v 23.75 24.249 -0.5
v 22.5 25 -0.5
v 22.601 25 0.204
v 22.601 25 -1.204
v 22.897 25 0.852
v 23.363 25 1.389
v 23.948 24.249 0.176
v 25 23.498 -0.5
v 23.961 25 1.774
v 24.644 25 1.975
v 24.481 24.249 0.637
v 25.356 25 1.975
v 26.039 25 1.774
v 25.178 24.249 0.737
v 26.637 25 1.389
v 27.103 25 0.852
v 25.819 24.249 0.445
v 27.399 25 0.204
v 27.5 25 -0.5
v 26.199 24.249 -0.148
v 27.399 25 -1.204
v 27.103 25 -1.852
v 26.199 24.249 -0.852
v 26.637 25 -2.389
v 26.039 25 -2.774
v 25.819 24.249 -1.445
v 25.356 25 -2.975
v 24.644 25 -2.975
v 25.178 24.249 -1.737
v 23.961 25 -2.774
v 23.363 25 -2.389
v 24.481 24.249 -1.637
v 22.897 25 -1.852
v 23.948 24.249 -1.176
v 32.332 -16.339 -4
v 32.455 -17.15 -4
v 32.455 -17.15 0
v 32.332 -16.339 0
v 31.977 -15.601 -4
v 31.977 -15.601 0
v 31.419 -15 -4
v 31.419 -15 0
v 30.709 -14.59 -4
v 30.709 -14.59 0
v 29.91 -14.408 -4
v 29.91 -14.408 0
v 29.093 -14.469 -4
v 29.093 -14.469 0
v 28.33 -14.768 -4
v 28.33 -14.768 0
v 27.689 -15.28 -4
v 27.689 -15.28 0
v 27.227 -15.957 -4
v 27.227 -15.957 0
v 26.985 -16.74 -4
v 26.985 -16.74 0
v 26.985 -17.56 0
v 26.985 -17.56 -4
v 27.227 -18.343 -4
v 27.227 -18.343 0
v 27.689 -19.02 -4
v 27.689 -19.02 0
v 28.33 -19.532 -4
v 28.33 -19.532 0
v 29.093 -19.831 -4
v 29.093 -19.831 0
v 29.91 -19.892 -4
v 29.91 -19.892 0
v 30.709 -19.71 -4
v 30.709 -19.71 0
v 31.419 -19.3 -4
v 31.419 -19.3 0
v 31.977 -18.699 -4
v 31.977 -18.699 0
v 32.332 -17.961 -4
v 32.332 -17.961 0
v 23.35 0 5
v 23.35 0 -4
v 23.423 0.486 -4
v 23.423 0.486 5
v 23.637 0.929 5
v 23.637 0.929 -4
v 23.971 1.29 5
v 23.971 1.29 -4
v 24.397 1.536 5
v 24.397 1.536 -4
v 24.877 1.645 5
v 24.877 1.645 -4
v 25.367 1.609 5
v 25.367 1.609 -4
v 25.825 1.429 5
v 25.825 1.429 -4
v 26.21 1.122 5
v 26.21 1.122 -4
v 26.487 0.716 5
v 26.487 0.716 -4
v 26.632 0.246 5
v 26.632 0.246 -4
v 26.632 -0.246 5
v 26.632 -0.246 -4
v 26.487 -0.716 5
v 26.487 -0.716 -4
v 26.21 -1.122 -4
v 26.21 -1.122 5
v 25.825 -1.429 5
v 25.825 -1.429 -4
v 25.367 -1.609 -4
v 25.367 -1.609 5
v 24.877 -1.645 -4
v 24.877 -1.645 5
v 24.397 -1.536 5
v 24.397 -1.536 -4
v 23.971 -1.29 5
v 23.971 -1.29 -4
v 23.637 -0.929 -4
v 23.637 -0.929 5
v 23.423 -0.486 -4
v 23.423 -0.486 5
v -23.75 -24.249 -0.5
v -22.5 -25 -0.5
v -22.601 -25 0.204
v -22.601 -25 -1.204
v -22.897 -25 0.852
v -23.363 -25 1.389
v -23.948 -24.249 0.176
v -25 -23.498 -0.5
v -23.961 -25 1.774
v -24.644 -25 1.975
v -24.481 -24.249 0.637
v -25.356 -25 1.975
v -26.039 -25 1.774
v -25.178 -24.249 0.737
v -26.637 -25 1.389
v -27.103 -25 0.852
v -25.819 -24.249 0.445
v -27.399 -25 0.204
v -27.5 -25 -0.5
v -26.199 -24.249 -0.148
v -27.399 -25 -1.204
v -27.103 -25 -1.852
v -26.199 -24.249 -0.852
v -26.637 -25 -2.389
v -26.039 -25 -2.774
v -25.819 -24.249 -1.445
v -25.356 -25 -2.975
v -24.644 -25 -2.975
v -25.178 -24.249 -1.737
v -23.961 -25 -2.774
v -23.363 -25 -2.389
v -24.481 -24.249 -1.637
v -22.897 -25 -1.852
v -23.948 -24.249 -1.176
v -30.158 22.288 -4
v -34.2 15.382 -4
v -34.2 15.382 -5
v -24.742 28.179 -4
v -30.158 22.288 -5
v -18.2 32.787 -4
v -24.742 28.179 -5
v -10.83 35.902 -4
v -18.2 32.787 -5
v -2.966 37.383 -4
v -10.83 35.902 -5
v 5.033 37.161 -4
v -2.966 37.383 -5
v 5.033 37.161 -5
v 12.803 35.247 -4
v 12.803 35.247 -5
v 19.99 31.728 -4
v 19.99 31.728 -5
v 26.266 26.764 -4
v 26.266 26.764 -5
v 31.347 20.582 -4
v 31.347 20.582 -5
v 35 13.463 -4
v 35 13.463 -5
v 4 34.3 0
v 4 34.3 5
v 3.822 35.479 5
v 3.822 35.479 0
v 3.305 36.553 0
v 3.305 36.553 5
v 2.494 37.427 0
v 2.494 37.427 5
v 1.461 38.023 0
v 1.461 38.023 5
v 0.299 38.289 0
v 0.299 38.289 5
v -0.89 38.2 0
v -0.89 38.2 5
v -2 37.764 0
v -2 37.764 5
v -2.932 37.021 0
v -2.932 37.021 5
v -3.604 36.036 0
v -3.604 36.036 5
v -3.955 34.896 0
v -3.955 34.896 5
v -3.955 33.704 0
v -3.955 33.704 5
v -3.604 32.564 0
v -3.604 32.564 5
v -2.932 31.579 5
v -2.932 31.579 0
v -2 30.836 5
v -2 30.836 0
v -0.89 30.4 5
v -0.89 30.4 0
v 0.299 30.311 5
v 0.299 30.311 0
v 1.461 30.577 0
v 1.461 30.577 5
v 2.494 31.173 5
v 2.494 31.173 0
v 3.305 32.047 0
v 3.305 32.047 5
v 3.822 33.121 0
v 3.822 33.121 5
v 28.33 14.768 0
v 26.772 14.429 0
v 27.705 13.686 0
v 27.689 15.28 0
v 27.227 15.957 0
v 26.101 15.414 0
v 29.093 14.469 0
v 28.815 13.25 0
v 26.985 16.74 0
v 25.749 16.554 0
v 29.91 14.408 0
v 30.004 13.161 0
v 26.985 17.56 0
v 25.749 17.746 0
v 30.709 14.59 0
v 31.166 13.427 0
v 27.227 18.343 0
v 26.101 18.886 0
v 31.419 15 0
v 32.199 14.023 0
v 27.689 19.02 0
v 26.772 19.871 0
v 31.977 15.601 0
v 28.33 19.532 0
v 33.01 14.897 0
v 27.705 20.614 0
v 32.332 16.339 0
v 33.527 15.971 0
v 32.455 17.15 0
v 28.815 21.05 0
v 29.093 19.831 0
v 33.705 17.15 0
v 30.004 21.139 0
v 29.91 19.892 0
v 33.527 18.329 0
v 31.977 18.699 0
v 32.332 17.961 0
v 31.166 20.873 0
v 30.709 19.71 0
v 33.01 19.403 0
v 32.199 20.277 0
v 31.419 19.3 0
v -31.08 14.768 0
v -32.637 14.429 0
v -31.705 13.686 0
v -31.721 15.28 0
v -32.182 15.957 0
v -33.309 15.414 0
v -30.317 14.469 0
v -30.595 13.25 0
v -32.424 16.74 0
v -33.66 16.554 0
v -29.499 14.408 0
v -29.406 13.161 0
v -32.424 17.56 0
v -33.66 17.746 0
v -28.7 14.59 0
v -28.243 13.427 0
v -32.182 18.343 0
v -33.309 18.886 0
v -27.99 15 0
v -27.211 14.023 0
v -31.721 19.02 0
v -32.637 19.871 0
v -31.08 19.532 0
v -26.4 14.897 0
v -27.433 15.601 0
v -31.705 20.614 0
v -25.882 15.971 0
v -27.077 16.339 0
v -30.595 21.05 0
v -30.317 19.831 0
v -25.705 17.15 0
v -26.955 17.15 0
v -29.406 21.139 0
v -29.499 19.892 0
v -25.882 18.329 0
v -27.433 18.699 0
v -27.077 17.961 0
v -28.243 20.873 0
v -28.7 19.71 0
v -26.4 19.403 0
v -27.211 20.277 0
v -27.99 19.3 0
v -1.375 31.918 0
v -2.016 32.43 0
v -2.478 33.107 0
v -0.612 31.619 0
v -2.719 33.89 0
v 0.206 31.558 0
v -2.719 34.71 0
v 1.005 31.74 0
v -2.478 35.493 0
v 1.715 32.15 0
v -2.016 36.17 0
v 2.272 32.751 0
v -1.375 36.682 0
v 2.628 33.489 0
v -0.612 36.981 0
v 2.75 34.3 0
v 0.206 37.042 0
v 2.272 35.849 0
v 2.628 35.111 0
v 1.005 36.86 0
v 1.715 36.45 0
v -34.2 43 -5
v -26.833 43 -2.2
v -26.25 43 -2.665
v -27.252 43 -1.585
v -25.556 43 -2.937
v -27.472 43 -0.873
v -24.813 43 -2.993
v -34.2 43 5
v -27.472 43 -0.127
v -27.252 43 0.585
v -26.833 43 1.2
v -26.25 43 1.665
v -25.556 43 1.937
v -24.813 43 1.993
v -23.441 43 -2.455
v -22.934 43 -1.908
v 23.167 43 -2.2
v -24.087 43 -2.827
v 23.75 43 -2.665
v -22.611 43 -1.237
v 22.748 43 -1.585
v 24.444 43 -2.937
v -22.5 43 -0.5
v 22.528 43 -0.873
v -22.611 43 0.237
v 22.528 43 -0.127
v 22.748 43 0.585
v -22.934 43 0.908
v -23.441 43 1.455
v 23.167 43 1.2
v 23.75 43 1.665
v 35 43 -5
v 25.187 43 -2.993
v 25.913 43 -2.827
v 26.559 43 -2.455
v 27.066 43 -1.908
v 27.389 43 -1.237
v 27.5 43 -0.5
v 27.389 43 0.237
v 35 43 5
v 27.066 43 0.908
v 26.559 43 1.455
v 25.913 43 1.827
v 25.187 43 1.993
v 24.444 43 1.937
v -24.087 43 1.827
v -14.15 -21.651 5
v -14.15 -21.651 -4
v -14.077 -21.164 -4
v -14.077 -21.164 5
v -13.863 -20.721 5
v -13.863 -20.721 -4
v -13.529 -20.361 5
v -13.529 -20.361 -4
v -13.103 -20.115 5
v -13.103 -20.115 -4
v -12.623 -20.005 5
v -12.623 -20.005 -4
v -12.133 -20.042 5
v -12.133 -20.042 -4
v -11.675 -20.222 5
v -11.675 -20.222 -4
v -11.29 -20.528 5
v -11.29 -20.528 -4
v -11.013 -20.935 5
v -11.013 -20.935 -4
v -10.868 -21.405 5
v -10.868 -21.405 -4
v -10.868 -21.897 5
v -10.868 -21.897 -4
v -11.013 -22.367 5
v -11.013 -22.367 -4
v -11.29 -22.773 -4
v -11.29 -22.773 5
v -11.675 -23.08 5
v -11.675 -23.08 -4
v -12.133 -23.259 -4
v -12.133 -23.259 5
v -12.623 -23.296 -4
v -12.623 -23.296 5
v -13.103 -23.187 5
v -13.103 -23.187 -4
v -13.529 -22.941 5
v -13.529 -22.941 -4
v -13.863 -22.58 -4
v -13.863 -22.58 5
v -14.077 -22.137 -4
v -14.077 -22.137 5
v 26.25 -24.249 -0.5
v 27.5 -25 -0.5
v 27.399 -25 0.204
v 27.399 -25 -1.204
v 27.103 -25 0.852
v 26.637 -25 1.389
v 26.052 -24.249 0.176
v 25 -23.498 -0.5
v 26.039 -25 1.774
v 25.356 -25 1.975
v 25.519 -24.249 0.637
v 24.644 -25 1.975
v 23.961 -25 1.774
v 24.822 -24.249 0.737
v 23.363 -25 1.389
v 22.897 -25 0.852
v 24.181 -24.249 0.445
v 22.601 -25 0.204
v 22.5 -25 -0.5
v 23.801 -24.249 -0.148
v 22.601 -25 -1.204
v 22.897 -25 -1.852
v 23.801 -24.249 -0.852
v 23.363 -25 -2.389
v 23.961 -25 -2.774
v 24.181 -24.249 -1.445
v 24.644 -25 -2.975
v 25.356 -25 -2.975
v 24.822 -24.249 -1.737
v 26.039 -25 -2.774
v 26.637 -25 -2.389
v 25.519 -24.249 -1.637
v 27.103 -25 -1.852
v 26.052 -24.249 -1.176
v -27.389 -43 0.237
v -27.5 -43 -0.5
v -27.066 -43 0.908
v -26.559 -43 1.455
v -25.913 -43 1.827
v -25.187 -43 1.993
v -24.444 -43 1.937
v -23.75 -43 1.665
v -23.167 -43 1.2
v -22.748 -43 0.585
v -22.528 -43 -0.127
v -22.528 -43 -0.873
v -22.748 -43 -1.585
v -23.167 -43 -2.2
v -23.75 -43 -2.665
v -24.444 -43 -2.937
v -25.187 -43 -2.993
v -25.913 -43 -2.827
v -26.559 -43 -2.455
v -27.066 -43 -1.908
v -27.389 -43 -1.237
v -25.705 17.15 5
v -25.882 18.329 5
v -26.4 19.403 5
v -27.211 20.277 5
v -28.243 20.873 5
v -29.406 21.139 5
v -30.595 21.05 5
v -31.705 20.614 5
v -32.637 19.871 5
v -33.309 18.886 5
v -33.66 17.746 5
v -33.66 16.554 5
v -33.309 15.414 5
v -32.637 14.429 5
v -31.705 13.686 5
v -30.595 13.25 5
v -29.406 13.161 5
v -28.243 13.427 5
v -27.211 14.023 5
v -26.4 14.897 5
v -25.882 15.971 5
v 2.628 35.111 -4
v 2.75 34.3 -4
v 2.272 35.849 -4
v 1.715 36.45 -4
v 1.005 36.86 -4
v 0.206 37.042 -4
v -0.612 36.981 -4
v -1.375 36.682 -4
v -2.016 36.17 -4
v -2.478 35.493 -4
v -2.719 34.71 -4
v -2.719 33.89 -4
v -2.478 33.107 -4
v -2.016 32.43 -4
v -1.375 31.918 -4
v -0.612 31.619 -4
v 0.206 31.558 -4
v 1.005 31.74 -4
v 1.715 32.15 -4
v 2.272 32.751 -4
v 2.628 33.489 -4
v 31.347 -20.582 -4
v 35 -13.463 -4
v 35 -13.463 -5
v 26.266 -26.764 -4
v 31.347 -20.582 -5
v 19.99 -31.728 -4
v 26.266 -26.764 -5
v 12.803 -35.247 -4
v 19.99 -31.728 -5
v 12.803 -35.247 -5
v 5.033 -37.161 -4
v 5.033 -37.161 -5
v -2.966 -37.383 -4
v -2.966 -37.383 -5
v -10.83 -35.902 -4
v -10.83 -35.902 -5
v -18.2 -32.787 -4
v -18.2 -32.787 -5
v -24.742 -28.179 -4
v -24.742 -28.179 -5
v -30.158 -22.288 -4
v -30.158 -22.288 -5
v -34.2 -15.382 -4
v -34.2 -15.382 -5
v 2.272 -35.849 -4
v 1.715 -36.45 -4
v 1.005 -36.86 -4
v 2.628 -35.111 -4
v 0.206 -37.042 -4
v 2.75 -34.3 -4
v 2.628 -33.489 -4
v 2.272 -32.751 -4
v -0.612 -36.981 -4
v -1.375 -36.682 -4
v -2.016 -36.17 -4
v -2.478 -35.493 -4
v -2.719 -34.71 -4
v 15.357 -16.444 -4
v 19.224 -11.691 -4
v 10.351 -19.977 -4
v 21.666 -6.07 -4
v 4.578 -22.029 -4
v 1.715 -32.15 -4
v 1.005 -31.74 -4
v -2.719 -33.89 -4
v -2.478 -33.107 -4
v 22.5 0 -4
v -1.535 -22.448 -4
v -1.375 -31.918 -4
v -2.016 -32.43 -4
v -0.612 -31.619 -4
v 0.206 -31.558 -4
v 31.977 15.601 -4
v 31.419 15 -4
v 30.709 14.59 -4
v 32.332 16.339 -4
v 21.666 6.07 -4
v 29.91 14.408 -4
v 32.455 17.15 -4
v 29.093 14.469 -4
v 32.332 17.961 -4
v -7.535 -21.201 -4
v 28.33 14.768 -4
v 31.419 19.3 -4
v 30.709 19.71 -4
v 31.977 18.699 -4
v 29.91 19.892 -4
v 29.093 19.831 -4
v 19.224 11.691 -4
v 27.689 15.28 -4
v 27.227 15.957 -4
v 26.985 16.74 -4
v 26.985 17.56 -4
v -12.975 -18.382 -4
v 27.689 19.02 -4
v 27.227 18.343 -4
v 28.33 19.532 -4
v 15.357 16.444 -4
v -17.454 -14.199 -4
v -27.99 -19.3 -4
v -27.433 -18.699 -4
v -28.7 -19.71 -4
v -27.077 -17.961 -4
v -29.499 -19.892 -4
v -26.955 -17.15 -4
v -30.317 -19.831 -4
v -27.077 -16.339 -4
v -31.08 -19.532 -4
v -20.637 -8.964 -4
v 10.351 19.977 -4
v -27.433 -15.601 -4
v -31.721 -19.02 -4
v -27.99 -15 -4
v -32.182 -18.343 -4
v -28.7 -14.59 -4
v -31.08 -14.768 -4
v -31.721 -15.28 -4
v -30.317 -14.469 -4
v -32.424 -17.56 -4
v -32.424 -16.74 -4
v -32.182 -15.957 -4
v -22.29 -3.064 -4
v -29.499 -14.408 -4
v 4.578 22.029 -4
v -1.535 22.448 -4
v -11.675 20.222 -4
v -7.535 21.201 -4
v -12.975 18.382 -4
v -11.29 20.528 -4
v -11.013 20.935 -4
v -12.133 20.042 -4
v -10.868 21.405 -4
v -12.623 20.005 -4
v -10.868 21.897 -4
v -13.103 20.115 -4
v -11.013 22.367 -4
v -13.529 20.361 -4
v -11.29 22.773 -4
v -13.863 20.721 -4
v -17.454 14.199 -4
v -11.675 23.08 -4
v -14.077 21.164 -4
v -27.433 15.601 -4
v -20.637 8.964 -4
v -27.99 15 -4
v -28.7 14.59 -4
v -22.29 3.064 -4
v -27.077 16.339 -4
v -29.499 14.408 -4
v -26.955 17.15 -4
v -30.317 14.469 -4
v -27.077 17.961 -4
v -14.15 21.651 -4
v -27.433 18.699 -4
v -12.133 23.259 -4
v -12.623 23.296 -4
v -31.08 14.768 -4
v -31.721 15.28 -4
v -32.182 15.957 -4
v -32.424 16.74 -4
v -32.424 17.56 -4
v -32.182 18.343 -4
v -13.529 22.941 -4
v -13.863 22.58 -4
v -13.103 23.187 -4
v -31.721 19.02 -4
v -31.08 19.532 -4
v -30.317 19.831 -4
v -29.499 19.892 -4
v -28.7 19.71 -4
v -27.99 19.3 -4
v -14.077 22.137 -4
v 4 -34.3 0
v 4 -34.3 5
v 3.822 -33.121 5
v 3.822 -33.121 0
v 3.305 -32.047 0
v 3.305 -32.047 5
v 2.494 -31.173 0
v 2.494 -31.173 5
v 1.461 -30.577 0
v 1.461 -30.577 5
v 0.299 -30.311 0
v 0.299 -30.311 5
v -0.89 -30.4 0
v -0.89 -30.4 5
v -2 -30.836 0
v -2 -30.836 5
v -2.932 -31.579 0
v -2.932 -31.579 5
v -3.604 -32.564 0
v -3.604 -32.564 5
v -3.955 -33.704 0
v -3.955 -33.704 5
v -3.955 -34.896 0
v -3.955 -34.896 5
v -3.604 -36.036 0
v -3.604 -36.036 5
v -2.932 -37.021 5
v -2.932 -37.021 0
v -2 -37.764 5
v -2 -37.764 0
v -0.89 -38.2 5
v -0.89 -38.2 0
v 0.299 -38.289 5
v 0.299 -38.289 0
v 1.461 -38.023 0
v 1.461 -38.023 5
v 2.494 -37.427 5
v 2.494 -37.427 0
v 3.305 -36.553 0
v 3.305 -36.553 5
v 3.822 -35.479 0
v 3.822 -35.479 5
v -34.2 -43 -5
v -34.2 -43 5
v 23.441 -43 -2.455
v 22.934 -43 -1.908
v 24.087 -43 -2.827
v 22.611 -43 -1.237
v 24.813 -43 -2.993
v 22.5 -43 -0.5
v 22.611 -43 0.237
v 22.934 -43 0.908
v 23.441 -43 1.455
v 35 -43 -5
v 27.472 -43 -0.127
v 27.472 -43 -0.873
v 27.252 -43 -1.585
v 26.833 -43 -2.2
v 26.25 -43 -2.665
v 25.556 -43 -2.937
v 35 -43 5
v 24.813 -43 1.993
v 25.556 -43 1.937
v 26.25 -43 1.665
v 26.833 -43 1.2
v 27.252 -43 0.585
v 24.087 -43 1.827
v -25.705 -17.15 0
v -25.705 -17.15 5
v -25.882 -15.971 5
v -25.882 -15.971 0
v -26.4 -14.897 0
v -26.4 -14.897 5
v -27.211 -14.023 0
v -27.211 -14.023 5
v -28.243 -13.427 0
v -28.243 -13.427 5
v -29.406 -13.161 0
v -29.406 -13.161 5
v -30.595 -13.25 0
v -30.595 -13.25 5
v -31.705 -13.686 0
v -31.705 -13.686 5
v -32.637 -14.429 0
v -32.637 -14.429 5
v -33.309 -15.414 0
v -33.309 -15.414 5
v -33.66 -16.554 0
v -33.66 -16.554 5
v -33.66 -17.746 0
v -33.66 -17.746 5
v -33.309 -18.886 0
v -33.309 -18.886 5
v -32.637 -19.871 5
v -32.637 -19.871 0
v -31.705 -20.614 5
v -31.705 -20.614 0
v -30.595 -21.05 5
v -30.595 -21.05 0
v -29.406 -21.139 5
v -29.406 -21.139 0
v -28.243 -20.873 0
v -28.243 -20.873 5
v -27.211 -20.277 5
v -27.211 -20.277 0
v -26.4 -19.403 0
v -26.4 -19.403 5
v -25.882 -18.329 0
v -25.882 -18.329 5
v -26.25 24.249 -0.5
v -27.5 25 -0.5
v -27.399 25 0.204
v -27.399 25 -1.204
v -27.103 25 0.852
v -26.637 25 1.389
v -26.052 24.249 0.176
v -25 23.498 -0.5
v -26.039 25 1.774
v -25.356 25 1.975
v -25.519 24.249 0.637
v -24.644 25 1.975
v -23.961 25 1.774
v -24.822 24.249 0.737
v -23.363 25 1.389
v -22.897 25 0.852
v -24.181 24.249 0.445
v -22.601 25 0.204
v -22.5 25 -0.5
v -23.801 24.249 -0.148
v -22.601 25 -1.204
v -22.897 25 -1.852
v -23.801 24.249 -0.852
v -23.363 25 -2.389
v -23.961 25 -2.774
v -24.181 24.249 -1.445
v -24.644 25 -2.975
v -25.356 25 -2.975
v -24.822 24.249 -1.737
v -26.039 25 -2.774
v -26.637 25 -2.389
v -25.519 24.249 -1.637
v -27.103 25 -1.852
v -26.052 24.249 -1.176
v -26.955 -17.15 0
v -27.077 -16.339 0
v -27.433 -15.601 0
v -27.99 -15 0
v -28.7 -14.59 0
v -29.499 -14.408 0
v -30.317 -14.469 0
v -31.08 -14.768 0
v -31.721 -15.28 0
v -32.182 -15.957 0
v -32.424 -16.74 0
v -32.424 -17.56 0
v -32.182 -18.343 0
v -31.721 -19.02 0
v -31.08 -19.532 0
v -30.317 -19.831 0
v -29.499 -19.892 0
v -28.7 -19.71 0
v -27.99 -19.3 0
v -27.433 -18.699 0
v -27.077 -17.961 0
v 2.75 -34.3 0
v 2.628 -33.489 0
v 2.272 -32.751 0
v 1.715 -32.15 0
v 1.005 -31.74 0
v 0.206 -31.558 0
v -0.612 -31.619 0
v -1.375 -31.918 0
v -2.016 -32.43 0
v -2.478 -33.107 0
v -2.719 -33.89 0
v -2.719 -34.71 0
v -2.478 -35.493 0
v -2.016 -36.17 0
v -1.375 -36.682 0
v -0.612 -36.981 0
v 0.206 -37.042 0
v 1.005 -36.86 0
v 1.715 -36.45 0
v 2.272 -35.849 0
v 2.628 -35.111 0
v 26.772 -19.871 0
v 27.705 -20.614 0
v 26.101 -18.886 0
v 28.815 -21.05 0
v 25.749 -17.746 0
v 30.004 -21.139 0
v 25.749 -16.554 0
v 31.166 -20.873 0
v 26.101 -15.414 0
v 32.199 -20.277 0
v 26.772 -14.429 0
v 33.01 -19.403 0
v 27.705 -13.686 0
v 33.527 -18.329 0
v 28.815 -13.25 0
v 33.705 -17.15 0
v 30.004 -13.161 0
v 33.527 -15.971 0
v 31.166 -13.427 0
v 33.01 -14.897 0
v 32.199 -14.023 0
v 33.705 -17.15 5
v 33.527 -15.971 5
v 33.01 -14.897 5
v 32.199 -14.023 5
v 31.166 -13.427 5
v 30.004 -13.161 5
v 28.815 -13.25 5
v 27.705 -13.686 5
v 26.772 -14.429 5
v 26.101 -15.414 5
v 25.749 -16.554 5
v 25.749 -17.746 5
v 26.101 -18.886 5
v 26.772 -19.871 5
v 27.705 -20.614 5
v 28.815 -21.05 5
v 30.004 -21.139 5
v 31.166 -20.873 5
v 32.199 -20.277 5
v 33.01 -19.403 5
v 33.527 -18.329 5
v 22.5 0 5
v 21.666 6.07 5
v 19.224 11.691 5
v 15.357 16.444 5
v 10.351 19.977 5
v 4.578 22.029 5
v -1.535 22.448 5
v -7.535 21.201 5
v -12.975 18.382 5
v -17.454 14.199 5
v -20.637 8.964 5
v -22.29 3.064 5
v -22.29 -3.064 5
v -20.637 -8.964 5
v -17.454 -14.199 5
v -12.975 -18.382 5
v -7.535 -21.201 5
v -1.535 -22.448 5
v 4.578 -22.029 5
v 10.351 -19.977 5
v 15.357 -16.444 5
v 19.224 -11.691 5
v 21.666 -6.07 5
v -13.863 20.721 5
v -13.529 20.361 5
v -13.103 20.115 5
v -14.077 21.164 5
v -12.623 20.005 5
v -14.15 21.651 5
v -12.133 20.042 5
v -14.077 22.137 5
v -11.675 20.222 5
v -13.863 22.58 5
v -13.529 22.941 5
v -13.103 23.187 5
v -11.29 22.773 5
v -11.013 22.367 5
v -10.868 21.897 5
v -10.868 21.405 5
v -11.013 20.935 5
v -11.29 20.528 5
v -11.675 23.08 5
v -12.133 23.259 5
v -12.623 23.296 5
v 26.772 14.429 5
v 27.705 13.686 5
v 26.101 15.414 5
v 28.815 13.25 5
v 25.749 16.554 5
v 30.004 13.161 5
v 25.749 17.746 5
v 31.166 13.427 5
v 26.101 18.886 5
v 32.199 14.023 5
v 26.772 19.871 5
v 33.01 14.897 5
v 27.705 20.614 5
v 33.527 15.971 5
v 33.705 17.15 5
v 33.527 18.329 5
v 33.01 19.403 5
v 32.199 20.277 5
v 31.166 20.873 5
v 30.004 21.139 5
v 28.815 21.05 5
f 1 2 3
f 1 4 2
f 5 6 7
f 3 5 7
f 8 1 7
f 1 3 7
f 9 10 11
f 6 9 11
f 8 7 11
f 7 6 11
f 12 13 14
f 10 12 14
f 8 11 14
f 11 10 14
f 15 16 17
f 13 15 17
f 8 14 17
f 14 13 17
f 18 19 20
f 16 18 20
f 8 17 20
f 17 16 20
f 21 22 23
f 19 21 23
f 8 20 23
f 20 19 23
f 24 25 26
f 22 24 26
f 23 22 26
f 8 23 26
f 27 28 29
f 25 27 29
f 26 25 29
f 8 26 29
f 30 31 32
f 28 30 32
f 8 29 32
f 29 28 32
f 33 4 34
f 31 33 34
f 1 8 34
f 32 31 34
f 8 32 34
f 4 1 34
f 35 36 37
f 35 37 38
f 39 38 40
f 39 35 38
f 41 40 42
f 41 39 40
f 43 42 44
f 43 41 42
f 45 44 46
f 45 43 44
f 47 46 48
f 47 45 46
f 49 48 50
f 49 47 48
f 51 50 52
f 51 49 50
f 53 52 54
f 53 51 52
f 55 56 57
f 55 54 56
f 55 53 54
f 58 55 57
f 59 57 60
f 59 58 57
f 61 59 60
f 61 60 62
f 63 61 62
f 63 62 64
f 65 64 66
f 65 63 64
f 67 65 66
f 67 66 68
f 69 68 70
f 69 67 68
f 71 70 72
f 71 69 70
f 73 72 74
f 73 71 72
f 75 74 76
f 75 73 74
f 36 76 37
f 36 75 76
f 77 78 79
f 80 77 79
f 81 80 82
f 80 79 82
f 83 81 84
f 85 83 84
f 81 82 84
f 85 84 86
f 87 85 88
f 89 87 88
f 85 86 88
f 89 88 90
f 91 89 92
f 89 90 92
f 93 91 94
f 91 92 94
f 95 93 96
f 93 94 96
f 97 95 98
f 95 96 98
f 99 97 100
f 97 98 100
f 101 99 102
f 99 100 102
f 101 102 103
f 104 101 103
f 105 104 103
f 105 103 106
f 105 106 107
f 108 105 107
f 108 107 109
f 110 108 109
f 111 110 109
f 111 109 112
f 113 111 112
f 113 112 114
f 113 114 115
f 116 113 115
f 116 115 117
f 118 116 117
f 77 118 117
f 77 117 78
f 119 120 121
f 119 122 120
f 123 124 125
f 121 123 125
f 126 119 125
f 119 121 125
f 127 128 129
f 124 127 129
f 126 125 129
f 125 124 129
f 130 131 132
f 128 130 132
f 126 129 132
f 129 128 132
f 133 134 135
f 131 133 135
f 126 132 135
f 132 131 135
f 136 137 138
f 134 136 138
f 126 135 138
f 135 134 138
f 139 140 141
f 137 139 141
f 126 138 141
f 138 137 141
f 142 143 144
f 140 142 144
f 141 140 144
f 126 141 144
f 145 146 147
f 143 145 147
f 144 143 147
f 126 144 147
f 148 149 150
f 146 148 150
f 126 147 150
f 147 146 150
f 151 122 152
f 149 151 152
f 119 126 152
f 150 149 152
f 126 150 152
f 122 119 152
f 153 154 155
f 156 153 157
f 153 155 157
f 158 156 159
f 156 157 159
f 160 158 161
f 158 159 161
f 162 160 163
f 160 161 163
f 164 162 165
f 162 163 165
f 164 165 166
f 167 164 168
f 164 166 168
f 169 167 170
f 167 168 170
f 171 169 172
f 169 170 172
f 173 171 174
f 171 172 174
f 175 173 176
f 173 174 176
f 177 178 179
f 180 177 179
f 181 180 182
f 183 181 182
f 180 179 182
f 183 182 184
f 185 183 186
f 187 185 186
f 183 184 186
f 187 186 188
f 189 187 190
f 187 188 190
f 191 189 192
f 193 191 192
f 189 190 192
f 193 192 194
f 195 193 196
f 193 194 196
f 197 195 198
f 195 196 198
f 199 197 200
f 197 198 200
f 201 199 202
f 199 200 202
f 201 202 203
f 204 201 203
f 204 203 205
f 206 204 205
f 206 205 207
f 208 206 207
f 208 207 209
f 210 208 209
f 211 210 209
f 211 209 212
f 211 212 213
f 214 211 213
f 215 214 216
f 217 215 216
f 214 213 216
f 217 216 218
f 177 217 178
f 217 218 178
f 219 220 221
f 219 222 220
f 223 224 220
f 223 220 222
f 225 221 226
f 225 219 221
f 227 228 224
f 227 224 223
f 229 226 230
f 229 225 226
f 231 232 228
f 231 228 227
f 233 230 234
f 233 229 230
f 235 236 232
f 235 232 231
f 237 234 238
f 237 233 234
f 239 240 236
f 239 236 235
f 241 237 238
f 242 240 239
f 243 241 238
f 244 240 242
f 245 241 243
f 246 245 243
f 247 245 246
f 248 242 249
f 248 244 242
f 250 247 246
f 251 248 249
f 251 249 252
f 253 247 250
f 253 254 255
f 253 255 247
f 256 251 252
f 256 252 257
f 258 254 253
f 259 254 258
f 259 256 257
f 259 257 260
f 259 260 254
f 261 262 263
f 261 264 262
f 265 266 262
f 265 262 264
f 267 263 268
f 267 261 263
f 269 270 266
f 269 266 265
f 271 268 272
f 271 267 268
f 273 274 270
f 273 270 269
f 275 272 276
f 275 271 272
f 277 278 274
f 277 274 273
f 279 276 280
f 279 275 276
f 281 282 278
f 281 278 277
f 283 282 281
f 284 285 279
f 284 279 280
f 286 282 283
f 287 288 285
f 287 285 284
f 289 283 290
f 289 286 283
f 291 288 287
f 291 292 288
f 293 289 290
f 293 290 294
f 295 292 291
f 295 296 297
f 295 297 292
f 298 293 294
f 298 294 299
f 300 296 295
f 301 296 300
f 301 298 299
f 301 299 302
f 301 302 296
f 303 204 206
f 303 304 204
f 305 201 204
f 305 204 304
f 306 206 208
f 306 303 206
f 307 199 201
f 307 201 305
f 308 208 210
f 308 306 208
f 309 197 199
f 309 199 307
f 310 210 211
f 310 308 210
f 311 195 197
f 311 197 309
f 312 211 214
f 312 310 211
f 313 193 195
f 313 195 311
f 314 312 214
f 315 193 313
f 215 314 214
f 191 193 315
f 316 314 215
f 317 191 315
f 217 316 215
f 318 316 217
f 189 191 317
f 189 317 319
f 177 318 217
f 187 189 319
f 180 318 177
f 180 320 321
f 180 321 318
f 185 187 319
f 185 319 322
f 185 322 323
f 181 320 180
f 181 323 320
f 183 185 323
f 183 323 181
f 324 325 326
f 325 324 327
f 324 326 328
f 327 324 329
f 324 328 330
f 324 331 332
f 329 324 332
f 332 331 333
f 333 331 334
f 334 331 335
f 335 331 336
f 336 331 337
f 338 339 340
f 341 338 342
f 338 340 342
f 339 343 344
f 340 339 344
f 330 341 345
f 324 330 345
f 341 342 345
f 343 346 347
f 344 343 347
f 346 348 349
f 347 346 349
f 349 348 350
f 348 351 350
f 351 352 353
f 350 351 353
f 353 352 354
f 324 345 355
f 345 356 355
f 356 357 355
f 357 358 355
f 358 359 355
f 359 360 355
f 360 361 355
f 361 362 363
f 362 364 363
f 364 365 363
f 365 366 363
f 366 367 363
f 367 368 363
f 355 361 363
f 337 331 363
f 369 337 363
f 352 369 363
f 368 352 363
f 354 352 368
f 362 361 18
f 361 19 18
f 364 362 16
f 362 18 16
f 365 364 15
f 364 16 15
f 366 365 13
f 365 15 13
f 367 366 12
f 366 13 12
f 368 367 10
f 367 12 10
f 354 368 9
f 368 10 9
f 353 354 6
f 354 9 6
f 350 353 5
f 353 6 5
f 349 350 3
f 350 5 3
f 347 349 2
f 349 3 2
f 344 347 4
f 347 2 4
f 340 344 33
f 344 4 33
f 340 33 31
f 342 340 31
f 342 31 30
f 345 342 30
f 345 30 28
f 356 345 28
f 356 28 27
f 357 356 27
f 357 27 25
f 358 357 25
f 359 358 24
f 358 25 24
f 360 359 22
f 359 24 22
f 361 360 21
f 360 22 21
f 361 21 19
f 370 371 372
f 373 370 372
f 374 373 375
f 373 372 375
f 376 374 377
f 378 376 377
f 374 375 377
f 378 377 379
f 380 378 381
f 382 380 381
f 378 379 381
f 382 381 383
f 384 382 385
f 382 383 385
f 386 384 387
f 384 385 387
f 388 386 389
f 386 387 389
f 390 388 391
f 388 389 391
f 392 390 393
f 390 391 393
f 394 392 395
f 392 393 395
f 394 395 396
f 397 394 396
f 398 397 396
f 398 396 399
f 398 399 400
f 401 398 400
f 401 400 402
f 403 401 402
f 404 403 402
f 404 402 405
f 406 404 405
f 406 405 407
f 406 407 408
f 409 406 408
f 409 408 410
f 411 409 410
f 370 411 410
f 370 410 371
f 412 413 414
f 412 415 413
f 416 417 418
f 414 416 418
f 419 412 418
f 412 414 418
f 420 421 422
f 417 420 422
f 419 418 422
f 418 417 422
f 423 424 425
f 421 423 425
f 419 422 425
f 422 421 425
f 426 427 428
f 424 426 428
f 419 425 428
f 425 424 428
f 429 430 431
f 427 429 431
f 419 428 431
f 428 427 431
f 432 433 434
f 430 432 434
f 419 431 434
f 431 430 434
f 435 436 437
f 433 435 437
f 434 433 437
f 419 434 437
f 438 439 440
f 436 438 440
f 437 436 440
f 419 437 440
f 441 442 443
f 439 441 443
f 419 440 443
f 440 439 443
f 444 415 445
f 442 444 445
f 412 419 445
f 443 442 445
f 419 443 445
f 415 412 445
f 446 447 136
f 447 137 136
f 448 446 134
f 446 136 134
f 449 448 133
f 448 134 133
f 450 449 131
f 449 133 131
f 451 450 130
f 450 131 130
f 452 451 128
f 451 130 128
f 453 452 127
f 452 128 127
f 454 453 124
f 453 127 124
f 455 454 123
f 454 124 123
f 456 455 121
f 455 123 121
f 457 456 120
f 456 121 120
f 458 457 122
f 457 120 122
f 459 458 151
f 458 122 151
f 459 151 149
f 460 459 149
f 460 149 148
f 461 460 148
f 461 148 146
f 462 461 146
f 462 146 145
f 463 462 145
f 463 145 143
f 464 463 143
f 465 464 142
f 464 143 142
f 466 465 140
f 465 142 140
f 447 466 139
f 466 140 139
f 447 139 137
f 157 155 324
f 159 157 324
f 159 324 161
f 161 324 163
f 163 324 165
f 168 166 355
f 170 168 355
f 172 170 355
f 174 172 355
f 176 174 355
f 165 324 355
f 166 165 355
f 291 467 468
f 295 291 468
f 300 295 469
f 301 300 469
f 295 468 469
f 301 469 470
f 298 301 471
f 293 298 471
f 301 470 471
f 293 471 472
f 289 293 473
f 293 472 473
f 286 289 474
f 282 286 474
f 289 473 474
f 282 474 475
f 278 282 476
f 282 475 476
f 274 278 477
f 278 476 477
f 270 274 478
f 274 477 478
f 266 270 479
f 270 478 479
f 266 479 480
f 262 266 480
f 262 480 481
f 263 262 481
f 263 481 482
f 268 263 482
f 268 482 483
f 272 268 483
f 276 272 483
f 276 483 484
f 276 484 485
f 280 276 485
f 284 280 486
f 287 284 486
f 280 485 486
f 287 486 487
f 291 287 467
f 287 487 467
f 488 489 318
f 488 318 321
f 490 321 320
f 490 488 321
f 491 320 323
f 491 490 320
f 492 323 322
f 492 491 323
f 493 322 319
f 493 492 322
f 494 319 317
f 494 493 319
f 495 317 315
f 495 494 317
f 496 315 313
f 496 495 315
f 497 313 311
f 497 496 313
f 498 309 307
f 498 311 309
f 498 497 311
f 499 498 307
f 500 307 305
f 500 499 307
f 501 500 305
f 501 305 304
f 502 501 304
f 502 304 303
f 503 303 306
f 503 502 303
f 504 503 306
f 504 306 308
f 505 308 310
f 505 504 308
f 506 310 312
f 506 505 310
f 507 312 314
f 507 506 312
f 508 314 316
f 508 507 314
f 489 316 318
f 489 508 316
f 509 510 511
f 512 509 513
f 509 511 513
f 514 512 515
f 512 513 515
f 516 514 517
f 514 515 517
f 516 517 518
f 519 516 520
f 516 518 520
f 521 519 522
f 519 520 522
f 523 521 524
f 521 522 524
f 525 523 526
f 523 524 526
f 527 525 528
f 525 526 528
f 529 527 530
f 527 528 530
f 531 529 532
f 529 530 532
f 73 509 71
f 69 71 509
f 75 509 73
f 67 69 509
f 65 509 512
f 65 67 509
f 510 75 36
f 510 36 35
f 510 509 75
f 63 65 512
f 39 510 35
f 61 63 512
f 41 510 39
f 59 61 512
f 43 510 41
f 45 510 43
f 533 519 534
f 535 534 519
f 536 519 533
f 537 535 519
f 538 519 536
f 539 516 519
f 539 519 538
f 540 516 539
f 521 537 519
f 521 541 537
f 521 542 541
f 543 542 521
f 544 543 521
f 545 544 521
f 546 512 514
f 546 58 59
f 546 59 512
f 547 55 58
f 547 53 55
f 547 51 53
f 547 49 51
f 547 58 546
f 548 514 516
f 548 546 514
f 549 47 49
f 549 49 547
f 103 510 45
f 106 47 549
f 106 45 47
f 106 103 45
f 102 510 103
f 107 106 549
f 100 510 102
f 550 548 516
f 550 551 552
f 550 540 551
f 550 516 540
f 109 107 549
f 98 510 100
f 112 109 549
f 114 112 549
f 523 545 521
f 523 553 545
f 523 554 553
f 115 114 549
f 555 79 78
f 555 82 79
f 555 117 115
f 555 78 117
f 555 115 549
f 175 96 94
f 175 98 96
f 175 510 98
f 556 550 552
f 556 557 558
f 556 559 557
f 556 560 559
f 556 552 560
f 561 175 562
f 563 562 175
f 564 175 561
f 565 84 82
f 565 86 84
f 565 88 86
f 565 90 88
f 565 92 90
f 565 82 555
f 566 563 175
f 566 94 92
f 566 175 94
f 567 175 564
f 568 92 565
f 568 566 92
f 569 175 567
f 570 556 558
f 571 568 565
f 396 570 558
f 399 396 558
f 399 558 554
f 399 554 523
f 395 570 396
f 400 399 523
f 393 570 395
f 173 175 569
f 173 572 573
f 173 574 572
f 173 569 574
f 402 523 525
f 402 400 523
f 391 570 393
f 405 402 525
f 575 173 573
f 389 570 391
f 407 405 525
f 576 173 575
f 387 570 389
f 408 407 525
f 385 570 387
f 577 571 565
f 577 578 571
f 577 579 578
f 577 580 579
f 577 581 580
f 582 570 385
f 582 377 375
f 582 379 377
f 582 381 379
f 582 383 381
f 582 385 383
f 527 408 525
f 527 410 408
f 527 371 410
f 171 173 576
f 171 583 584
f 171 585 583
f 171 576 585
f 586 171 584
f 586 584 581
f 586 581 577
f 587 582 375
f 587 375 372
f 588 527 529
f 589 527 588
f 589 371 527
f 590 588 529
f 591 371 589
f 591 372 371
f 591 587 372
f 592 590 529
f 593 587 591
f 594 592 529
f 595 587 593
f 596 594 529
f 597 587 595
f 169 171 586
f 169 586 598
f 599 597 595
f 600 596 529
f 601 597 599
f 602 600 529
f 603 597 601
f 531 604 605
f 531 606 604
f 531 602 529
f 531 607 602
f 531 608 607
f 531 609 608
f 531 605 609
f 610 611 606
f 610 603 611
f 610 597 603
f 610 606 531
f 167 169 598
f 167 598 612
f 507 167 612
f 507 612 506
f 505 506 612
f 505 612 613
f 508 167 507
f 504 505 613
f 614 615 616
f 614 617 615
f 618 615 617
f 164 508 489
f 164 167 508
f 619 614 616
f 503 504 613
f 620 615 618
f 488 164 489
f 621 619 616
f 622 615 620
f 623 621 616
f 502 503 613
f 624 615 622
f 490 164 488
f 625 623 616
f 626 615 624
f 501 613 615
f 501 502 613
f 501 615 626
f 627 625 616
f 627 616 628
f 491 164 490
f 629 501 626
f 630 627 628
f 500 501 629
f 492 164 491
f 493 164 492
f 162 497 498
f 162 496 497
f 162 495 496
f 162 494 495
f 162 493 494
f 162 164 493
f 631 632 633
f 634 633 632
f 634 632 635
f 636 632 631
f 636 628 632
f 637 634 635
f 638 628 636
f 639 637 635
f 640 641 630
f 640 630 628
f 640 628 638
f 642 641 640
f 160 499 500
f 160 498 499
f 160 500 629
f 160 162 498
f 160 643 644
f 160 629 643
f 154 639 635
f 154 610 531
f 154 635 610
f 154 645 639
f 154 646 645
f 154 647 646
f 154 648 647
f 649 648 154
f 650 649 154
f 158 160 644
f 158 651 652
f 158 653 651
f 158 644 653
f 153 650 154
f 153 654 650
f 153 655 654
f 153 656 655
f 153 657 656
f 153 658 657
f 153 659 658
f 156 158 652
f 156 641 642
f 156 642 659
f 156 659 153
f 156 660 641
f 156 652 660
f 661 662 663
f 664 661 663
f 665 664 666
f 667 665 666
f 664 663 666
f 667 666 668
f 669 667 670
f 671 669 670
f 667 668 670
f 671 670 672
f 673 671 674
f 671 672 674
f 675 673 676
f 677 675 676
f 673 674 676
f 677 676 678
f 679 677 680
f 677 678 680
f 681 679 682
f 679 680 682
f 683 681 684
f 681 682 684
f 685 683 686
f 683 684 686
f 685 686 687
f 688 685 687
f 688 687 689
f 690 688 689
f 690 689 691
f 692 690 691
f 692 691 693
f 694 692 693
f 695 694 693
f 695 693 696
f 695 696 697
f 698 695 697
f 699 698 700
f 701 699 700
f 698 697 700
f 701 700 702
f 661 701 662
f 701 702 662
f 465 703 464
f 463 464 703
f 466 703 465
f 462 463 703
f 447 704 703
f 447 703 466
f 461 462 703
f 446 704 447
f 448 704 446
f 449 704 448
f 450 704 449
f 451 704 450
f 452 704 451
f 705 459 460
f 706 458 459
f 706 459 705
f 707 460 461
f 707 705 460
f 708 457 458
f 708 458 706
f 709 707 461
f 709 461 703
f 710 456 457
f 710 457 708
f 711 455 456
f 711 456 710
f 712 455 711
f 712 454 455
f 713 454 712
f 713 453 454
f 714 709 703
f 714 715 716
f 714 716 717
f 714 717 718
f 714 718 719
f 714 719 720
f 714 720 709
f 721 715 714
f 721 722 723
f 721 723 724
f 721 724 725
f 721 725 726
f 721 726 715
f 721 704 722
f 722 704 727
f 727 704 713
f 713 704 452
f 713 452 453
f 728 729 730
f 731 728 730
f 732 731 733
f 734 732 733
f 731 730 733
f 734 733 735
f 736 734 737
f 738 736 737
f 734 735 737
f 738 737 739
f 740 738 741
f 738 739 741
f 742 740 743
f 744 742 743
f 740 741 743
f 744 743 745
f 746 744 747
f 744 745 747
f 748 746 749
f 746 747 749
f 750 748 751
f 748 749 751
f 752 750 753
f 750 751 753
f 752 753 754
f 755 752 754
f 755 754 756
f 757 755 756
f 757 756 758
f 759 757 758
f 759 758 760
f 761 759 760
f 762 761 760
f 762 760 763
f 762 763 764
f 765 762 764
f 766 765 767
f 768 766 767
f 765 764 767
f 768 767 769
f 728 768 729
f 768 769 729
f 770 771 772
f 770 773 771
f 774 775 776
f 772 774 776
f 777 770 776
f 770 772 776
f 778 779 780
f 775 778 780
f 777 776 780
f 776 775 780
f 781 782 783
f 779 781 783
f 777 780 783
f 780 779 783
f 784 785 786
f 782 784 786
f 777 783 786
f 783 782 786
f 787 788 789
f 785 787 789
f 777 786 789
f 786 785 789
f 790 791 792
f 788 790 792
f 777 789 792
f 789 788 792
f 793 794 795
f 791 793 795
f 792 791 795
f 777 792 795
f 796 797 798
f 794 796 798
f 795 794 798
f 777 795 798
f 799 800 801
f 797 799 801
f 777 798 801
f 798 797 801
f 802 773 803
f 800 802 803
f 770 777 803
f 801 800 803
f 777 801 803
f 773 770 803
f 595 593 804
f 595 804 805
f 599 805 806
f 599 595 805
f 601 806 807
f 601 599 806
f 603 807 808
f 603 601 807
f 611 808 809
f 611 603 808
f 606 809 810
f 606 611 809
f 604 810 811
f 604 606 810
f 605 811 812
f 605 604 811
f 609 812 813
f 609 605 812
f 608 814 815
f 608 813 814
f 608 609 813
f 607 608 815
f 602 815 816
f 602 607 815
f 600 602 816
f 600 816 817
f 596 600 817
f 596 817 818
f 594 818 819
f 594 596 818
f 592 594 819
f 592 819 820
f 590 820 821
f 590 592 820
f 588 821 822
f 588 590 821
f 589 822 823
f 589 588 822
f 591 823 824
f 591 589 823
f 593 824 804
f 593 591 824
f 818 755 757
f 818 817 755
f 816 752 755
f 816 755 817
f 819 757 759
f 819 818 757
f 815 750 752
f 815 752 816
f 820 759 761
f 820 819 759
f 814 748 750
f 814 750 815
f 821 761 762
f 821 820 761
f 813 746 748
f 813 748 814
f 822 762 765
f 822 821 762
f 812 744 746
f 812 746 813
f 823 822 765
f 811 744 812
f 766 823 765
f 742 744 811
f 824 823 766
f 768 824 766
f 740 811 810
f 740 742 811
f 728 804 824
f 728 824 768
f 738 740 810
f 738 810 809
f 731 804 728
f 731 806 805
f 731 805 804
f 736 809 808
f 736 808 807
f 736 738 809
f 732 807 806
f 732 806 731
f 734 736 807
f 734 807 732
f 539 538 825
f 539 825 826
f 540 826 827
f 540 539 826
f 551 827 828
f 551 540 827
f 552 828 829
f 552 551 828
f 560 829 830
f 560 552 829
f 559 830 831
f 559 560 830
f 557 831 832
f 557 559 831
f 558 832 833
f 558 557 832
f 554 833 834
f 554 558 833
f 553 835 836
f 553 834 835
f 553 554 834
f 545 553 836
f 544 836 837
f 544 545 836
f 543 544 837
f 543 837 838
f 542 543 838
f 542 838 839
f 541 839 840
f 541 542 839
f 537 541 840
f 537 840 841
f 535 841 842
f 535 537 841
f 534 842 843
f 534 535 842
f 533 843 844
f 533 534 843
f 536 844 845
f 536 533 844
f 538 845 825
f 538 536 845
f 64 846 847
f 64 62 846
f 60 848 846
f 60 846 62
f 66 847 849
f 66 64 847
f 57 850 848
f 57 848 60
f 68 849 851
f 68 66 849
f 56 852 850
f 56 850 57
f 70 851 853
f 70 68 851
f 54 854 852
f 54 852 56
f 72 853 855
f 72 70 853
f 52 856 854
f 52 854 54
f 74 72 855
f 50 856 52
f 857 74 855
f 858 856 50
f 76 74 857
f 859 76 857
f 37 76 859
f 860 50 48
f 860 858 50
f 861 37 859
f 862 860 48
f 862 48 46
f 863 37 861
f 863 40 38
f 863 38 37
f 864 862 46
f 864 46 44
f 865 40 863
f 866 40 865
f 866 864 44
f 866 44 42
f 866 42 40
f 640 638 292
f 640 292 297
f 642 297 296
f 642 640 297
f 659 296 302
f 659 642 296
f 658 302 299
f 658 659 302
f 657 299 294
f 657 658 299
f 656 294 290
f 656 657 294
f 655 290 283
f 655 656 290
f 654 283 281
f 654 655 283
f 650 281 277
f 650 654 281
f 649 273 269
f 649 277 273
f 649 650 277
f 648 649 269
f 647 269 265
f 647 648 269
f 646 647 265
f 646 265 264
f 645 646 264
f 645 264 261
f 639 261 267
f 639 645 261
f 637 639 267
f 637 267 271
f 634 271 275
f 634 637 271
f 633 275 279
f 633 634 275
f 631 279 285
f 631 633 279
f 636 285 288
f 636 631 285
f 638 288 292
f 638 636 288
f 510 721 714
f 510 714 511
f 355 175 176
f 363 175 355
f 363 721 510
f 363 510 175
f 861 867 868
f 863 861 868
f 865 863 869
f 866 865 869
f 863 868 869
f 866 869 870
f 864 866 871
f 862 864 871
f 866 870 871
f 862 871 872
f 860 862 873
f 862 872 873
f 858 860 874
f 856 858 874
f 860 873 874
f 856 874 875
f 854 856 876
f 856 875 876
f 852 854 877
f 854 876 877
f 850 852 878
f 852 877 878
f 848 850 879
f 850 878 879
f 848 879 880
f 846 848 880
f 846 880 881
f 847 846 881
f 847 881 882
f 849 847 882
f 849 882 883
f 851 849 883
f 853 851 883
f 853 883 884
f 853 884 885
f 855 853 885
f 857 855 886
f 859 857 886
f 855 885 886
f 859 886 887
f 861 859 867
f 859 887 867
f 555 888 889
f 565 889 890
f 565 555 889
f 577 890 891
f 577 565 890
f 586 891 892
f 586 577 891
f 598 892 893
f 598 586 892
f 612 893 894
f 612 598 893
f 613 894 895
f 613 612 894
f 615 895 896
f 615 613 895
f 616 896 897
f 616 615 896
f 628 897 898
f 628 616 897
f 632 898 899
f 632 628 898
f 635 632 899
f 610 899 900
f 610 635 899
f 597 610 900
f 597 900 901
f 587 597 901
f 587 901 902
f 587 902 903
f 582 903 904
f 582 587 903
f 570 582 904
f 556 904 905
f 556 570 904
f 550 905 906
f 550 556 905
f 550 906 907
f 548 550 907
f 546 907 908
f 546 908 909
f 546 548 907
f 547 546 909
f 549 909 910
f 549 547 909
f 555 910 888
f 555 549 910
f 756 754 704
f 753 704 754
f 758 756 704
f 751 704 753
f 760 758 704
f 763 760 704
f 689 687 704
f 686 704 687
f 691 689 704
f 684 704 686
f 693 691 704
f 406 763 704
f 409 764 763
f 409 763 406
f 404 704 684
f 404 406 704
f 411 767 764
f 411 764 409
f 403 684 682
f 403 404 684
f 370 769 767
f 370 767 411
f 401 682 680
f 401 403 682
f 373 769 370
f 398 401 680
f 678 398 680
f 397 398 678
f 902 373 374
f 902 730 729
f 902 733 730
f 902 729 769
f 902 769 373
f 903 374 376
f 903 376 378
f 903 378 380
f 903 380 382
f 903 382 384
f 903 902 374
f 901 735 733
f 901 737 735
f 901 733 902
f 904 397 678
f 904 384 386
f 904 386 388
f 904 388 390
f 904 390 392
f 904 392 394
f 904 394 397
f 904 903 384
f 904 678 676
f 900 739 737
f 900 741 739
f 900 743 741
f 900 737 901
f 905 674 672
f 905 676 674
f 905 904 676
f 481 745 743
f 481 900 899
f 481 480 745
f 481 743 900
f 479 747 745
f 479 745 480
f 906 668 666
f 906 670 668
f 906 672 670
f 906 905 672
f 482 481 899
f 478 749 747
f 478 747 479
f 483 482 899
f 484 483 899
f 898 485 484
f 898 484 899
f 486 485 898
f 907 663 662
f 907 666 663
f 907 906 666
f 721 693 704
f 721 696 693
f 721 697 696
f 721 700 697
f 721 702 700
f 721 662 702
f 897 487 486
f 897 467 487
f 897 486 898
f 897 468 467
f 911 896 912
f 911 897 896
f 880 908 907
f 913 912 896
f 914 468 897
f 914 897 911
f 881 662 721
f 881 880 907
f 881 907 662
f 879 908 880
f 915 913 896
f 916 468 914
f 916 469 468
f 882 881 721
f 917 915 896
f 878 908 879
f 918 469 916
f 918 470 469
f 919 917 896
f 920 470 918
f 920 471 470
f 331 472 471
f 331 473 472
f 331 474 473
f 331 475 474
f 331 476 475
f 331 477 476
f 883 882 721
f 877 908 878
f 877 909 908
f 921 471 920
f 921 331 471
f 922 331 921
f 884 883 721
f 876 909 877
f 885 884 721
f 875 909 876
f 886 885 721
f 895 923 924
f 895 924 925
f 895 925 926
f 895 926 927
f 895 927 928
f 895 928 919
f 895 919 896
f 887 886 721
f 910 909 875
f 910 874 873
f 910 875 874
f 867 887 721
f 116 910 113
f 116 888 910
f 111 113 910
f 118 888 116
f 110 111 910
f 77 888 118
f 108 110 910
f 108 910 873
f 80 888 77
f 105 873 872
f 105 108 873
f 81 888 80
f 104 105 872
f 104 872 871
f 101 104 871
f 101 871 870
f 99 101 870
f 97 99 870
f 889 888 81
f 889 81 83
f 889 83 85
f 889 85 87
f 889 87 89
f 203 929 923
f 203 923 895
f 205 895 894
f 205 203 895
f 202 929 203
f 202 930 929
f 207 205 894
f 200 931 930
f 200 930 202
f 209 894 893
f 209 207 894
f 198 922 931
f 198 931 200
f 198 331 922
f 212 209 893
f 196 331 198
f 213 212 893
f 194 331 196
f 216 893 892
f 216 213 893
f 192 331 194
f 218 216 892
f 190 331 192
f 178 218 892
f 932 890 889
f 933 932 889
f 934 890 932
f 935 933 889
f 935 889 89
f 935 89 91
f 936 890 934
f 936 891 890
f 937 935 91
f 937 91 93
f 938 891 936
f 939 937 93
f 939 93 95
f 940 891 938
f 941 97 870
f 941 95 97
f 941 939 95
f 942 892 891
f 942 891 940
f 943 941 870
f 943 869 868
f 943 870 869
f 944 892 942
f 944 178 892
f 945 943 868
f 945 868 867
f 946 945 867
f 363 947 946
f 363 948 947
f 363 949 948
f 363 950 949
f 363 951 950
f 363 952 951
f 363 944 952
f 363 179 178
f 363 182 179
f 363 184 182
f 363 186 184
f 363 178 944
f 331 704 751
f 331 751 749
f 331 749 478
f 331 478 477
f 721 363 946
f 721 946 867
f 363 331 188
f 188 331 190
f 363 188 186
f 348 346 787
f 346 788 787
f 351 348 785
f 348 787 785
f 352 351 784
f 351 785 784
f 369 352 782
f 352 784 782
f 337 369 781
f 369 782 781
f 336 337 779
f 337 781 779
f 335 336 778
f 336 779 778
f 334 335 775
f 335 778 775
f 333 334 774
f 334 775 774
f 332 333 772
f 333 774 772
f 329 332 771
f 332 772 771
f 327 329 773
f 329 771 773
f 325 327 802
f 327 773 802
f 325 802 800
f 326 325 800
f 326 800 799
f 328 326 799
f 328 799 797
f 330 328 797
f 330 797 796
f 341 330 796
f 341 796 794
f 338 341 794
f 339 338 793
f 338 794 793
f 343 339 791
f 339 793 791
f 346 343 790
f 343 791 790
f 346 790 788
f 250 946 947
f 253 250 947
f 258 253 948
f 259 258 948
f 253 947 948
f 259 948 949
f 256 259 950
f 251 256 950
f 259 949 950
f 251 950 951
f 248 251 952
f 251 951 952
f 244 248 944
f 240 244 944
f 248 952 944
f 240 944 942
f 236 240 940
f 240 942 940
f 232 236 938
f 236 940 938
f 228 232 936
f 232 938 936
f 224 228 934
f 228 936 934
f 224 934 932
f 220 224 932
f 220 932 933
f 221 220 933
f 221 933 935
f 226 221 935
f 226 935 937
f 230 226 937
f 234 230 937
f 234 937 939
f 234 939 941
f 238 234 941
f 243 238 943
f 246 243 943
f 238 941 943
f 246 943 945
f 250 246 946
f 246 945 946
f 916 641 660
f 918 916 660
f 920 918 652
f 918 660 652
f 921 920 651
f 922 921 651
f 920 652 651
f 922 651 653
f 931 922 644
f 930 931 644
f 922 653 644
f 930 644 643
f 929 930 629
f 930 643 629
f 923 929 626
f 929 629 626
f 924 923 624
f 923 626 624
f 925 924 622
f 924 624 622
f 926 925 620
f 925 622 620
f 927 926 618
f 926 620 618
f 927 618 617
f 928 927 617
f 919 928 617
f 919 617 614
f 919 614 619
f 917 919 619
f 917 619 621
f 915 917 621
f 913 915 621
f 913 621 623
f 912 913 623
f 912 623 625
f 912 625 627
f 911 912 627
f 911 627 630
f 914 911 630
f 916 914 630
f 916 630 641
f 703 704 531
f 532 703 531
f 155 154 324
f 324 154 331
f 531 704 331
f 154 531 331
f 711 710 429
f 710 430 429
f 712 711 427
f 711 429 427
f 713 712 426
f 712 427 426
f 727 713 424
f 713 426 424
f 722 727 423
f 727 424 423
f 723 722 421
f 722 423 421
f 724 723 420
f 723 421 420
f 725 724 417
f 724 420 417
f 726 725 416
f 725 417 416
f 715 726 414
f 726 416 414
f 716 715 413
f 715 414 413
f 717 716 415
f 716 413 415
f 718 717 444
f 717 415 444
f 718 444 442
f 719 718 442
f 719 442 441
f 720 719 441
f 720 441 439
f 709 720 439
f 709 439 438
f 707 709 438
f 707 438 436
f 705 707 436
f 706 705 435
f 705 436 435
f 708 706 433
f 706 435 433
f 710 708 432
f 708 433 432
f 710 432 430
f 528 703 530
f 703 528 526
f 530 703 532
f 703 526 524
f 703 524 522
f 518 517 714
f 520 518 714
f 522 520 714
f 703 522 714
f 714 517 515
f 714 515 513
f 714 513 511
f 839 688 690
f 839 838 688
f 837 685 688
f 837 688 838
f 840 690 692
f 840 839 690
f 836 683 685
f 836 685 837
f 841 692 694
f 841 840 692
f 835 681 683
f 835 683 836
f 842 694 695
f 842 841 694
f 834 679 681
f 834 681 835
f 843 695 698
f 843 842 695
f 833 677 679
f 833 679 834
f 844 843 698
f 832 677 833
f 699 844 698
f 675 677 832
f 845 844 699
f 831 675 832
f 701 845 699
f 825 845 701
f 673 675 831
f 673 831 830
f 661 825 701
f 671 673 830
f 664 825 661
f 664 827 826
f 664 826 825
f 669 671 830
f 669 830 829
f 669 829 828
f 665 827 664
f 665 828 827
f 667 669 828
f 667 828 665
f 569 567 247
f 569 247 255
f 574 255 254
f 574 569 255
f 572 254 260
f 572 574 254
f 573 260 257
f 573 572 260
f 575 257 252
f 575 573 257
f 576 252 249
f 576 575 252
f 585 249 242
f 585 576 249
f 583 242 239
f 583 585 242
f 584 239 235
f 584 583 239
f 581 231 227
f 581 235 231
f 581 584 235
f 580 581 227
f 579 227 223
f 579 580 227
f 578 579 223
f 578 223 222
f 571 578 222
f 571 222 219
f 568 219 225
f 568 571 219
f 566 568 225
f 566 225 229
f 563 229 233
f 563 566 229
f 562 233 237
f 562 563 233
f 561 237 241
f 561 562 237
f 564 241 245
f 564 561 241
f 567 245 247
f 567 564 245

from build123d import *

# Parameters (mm, degrees)
CROQUIS1_W                = 69.2
CROQUIS1_H                = 86
CROQUIS1_R                = 22.5
CROQUIS1_R_2              = 2.75
SALIENTE_EXTRUIR1_DEPTH   = 5
CROQUIS8_R                = 4
CORTAR_EXTRUIR3_DEPTH     = 5
TALADRO_ROSCADO_M42_D     = 3.3
TALADRO_ROSCADO_M62_D     = 5
TALADRO_ROSCADO_M62_DEPTH = 18
TALADRO_ROSCADO_M62_TIP   = 1.502151548
TALADRO_ROSCADO_M63_D     = 5
TALADRO_ROSCADO_M63_DEPTH = 18
TALADRO_ROSCADO_M63_TIP   = 1.502151548
CROQUIS15_R               = 37.5
CORTAR_EXTRUIR4_DEPTH     = 1


with BuildPart() as part:
    # Croquis1 → Saliente-Extruir1 (new body, symmetric)
    with BuildSketch(Plane.XY):
        with Locations((0.4, 0)):
            Rectangle(CROQUIS1_W, CROQUIS1_H)
        Circle(CROQUIS1_R, mode=Mode.SUBTRACT)
        with Locations((0, 34.3)):
            Circle(CROQUIS1_R_2, mode=Mode.SUBTRACT)
        with Locations((29.70467135, 17.15)):
            Circle(CROQUIS1_R_2, mode=Mode.SUBTRACT)
        with Locations((29.70467135, -17.15)):
            Circle(CROQUIS1_R_2, mode=Mode.SUBTRACT)
        with Locations((0, -34.3)):
            Circle(CROQUIS1_R_2, mode=Mode.SUBTRACT)
        with Locations((-29.70467135, -17.15)):
            Circle(CROQUIS1_R_2, mode=Mode.SUBTRACT)
        with Locations((-29.70467135, 17.15)):
            Circle(CROQUIS1_R_2, mode=Mode.SUBTRACT)
    extrude(amount=SALIENTE_EXTRUIR1_DEPTH, both=True)

    # Croquis8 → Cortar-Extruir3 (cut)
    with BuildSketch(Plane.XY.offset(5)):
        with Locations((-29.70467135, 17.15)):
            Circle(CROQUIS8_R)
        with Locations((0, 34.3)):
            Circle(CROQUIS8_R)
        with Locations((29.70467135, 17.15)):
            Circle(CROQUIS8_R)
        with Locations((29.70467135, -17.15)):
            Circle(CROQUIS8_R)
        with Locations((0, -34.3)):
            Circle(CROQUIS8_R)
        with Locations((-29.70467135, -17.15)):
            Circle(CROQUIS8_R)
    extrude(amount=-CORTAR_EXTRUIR3_DEPTH, mode=Mode.SUBTRACT)

    # Taladro roscado M42 (through all)
    with Locations(Plane.XY.offset(5)):
        with Locations((-12.5, 21.650635095), (-12.5, -21.650635095), (25, 0)):
            Hole(TALADRO_ROSCADO_M42_D / 2)

    # Taladro roscado M62
    with Locations(Plane(origin=(0, 43, 0), x_dir=(-1, 0, 0), z_dir=(0, 1, 0))):
        with Locations((25, -0.5), (-25, -0.5)):
            Hole(TALADRO_ROSCADO_M62_D / 2, depth=TALADRO_ROSCADO_M62_DEPTH)
            with Locations((0, 0, -(TALADRO_ROSCADO_M62_DEPTH + TALADRO_ROSCADO_M62_TIP / 2))):  # 118° drill point
                Cone(0, TALADRO_ROSCADO_M62_D / 2, TALADRO_ROSCADO_M62_TIP, mode=Mode.SUBTRACT)

    # Taladro roscado M63
    with Locations(Plane.XZ.offset(43)):
        with Locations((-25, -0.5), (25, -0.5)):
            Hole(TALADRO_ROSCADO_M63_D / 2, depth=TALADRO_ROSCADO_M63_DEPTH)
            with Locations((0, 0, -(TALADRO_ROSCADO_M63_DEPTH + TALADRO_ROSCADO_M63_TIP / 2))):  # 118° drill point
                Cone(0, TALADRO_ROSCADO_M63_D / 2, TALADRO_ROSCADO_M63_TIP, mode=Mode.SUBTRACT)

    # Croquis15 → Cortar-Extruir4 (cut)
    with BuildSketch(Plane(origin=(0, 0, -5), x_dir=(-1, 0, 0), z_dir=(0, 0, -1))):
        Circle(CROQUIS15_R)
    extrude(amount=-CORTAR_EXTRUIR4_DEPTH, mode=Mode.SUBTRACT)


solid = part.part
